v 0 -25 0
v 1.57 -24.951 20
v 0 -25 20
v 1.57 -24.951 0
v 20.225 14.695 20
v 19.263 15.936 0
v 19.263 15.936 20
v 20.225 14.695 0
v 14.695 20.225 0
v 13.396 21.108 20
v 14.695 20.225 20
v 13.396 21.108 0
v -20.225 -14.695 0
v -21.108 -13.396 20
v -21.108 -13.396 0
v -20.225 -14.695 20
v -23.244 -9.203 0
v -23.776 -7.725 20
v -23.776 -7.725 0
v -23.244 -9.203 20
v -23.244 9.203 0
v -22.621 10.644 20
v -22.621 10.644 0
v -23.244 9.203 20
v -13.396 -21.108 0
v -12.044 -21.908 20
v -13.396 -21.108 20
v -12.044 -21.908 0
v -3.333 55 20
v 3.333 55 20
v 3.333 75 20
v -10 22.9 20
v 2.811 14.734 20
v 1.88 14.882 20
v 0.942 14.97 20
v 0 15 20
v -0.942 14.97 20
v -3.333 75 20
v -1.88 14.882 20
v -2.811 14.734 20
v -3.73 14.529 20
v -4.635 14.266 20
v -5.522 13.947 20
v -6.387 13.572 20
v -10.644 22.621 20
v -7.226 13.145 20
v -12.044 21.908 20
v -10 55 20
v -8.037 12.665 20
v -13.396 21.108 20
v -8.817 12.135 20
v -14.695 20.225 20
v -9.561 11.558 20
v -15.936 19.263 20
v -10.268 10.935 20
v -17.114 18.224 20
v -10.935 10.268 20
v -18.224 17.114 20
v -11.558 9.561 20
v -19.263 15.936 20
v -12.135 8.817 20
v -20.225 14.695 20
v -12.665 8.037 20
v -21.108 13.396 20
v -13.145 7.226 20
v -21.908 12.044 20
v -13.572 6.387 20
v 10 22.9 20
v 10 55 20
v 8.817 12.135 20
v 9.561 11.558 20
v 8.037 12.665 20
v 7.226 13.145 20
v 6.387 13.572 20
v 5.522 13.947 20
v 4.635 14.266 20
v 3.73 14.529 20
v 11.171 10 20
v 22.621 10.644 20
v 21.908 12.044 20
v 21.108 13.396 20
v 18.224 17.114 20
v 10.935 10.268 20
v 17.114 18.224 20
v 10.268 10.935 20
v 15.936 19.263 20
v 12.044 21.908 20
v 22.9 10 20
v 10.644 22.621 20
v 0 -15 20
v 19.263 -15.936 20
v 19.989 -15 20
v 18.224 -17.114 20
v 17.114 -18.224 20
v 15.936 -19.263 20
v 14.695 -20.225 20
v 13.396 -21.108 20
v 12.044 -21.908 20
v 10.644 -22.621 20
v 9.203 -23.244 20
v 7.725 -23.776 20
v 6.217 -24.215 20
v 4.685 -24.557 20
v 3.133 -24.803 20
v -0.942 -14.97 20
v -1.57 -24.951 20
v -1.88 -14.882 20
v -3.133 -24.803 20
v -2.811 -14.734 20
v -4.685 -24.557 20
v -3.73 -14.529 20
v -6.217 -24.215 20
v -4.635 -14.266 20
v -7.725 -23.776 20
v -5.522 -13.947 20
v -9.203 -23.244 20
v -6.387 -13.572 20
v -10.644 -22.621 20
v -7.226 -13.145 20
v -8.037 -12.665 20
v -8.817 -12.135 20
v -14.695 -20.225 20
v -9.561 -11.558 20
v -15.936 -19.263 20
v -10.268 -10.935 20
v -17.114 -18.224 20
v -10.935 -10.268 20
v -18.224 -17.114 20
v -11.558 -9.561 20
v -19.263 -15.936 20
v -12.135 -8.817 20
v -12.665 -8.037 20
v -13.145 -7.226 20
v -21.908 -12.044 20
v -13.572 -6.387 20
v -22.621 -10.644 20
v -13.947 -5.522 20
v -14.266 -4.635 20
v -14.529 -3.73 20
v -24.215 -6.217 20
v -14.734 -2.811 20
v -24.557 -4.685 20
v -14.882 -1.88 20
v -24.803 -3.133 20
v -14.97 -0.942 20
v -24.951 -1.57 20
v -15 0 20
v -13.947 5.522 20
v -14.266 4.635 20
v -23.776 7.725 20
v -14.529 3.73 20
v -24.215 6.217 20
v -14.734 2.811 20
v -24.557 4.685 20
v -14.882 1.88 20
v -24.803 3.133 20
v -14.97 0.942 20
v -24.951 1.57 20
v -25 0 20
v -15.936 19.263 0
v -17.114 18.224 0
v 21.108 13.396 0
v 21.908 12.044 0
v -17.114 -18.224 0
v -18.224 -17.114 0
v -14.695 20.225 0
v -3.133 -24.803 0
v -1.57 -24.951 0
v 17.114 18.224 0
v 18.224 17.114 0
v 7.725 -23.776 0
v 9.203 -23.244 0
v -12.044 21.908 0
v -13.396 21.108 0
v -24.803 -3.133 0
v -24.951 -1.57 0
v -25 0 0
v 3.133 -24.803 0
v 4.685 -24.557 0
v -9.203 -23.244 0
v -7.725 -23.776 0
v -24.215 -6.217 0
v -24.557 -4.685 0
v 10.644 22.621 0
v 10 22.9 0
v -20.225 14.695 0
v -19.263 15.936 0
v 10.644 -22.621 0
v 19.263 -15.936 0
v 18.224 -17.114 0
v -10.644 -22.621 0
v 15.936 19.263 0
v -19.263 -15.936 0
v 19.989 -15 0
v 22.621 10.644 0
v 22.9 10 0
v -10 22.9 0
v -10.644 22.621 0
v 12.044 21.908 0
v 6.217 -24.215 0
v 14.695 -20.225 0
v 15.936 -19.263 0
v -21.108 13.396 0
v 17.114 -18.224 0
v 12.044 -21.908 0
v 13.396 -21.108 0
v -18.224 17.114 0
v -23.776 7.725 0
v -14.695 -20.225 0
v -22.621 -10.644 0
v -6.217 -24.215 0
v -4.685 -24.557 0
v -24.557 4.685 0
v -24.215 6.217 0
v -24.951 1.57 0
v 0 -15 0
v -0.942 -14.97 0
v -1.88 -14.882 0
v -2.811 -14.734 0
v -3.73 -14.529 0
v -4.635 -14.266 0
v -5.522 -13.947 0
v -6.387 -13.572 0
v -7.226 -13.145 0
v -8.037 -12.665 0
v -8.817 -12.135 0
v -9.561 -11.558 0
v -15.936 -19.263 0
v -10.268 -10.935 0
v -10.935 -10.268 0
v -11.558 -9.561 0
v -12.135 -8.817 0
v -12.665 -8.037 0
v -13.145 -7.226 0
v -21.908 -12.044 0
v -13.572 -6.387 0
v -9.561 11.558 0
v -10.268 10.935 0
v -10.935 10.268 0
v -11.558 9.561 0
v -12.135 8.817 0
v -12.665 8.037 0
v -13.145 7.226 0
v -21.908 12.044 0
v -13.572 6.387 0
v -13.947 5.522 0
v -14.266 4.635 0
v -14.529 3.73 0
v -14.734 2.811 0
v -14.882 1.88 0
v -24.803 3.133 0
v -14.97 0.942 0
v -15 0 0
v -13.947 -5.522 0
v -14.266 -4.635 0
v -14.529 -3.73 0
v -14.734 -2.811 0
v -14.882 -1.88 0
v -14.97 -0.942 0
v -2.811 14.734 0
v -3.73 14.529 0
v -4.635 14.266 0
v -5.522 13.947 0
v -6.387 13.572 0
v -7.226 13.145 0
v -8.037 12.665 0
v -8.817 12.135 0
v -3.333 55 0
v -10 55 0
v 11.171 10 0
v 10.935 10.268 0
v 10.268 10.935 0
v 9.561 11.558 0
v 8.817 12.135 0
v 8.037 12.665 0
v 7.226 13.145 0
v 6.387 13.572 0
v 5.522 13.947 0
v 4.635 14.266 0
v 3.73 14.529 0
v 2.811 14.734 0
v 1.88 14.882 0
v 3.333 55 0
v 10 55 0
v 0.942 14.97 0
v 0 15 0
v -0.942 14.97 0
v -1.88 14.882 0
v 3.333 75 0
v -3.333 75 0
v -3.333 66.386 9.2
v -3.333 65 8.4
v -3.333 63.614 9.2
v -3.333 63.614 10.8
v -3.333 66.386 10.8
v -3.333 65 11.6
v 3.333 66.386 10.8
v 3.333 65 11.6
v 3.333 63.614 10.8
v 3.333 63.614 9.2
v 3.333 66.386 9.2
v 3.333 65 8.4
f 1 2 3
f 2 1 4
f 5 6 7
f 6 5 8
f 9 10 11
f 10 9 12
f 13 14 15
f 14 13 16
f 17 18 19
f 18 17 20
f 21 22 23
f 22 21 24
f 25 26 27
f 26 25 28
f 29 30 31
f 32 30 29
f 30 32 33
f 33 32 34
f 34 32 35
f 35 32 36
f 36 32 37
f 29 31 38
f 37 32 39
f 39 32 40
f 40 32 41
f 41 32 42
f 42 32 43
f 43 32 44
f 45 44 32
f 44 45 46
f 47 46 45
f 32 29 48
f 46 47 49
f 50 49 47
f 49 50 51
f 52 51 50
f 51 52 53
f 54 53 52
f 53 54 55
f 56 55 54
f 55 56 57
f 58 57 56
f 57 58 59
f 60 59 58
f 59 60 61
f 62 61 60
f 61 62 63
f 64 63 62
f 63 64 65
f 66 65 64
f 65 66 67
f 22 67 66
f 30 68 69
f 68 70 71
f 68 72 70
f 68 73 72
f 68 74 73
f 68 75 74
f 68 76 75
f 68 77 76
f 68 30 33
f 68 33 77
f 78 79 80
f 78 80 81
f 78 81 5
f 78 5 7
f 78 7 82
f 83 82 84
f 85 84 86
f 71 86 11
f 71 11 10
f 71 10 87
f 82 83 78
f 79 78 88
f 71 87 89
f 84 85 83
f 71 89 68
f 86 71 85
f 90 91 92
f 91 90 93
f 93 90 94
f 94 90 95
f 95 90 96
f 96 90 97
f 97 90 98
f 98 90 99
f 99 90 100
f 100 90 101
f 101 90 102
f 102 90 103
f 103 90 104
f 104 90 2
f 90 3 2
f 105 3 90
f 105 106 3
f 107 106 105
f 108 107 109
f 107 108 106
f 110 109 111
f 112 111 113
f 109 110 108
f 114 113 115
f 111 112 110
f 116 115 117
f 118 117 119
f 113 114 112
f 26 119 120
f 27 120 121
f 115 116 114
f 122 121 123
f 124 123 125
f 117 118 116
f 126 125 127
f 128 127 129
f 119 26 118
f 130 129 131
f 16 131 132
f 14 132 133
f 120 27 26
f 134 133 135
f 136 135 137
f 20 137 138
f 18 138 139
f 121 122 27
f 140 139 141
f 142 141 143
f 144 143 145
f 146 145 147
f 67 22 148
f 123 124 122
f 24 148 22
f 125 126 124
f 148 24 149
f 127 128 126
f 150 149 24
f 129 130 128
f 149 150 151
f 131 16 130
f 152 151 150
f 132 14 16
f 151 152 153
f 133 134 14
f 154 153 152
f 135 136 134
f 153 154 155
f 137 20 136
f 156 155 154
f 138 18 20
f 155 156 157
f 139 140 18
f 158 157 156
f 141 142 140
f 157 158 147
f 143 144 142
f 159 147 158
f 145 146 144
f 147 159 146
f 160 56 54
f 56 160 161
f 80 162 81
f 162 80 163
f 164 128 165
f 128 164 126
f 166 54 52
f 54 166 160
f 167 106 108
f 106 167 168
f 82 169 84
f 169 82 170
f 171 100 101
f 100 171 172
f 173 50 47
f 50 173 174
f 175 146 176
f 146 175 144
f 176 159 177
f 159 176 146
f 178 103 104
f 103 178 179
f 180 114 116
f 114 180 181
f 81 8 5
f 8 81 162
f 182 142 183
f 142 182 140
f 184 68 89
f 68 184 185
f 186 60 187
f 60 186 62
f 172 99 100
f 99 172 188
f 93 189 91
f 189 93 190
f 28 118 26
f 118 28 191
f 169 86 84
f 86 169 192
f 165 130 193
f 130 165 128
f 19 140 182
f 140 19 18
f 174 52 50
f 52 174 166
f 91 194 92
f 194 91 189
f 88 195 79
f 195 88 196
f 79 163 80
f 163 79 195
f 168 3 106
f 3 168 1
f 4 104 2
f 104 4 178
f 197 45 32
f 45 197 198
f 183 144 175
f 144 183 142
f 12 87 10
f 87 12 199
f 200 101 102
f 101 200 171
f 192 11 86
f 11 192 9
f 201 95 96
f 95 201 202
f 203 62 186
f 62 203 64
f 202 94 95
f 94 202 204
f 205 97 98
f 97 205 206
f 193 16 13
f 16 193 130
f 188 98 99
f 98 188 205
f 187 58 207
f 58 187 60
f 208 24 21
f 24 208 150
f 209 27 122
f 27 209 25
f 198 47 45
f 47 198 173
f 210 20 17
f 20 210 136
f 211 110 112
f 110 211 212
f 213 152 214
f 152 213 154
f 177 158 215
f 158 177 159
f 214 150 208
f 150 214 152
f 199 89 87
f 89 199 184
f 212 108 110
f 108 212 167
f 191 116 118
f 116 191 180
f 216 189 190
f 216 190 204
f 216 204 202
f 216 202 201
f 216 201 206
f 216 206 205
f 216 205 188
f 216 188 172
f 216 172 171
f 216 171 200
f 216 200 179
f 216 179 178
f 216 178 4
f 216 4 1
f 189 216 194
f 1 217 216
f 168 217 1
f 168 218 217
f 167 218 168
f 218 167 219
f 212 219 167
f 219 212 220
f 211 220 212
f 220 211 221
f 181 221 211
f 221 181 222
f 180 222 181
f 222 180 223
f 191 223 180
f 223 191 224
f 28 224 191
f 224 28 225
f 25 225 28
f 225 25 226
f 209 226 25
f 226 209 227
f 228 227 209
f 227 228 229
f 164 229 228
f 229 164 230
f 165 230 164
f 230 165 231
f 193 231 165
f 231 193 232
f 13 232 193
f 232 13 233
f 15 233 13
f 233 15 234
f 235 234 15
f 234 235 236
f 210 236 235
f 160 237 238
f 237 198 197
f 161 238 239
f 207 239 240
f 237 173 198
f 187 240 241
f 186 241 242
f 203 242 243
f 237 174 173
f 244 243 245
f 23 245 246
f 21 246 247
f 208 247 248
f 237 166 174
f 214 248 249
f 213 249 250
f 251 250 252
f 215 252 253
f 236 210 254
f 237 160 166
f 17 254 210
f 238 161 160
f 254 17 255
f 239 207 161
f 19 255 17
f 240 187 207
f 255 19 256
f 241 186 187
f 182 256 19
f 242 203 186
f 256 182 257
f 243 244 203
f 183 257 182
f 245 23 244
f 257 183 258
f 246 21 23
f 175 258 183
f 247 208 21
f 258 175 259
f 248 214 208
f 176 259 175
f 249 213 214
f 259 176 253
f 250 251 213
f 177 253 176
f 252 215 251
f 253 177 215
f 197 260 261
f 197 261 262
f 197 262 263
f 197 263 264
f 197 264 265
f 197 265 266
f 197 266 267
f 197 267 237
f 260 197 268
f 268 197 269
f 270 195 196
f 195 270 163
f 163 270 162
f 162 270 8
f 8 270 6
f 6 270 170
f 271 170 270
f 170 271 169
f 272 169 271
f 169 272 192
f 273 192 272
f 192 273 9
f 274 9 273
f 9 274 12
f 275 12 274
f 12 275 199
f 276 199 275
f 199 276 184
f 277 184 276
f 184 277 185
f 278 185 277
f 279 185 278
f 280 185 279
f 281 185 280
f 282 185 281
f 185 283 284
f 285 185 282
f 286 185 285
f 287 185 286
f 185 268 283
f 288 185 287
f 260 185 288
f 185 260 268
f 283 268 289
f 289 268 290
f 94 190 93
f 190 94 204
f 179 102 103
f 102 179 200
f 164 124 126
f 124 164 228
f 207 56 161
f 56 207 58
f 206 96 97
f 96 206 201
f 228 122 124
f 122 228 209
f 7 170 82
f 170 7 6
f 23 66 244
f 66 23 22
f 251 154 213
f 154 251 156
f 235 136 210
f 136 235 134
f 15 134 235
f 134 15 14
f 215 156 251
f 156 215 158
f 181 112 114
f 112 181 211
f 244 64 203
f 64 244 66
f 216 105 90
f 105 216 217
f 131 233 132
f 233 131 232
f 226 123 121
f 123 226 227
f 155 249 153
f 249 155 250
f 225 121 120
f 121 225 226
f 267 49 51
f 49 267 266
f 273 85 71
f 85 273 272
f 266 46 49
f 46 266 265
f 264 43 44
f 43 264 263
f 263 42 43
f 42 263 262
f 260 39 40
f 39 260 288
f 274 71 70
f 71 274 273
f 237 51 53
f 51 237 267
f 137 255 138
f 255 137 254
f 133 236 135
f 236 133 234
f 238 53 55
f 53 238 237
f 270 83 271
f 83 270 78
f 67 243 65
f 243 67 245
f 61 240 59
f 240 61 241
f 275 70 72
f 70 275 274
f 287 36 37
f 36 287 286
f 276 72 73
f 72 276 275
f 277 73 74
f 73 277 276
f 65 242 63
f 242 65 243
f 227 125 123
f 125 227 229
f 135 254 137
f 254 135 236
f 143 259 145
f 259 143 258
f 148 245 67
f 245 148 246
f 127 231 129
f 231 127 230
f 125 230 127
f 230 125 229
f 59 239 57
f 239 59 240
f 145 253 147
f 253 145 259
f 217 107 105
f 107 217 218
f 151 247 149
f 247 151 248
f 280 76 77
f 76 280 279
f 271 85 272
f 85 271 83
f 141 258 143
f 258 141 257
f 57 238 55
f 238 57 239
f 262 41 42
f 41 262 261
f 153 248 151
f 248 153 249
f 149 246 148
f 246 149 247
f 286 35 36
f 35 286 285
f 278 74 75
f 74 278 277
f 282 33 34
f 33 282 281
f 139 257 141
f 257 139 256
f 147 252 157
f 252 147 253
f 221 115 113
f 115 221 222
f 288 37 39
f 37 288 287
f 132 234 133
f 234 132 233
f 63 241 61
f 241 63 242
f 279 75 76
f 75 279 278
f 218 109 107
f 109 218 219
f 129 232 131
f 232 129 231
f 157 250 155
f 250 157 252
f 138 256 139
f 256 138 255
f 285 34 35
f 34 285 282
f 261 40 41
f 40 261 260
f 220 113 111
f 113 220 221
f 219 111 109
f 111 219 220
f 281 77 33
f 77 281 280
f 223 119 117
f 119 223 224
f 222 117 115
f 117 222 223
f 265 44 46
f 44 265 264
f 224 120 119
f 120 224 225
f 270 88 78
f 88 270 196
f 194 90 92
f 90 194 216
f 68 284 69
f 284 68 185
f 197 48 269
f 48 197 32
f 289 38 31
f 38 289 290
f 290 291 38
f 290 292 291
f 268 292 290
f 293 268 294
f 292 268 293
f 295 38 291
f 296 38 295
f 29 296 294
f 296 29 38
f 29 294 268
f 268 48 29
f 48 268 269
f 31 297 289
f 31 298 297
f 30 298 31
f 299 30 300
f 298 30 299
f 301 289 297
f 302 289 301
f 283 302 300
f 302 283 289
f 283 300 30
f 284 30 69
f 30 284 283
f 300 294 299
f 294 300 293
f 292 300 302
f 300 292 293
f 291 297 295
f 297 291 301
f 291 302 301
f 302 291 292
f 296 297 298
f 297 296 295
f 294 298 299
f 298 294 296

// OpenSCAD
// file: ../deps/nutsnbolts/data-access.scad
// Norm Nuts and Bolts - a OpenSCAD library
// Copyright (C) 2012  Johannes Kneer

// This program is free software: you can redistribute it and/or modify
// it under the terms of the GNU General Public License as published by
// the Free Software Foundation, either version 3 of the License, or
// (at your option) any later version.

// This program is distributed in the hope that it will be useful,
// but WITHOUT ANY WARRANTY; without even the implied warranty of
// MERCHANTABILITY or FITNESS FOR A PARTICULAR PURPOSE.  See the
// GNU General Public License for more details.

// You should have received a copy of the GNU General Public License
// along with this program.  If not, see <http://www.gnu.org/licenses/>.


// DATABASE ACCESS FUNCTIONS AND CONSTANTS



// == CONSTANTS ==

// screw table access keys
_NB_S_DESC            = 0;
_NB_S_FAMKEY			    = 1;
_NB_S_LENGTH          = 2;
_NB_S_NOTHREAD_LENGTH = 3;

_NB_F_DESC			      = 0;
_NB_F_OUTER_DIA       = 1;
_NB_F_INNER_DIA       = 2;
_NB_F_LEAD            = 3;
_NB_F_KEY             = 4;
_NB_F_KEY_DEPTH       = 5;
_NB_F_HEAD_HEIGHT     = 6;
_NB_F_HEAD_DIA        = 7;
_NB_F_NUT_KEY         = 8;
_NB_F_NUT_HEIGHT      = 9;
_NB_F_PITCH_FINE      = 10;
_NB_F_PITCH_MEDIUM    = 11;
_NB_F_PITCH_COARSE    = 12;


// == FUNCTIONS ==

// _get_screw("descriptor")   with descriptor = M8x25
//   find the line for a general object in the data matrix

function _get_screw(n) = data_screw[search([n], data_screw)[0]];
function _get_screw_fam(n) = data_screw_fam[search([_get_screw(n)[_NB_S_FAMKEY]], data_screw_fam)[0]];

function _get_fam(n) = data_screw_fam[search([n], data_screw_fam)[0]];


// _get_XXXXX("descriptor") functions
// find a single property in the database

function _get_desc(n)        = _get_screw(n)[_NB_S_DESC];
function _get_famkey(n)         = _get_screw(n)[_NB_S_FAMKEY];
function _get_length(n)      = _get_screw(n)[_NB_S_LENGTH];
function _get_nt_length(n)   = _get_screw(n)[_NB_S_NOTHREAD_LENGTH];

function _get_outer_dia(n)   = _get_screw_fam(n)[_NB_F_OUTER_DIA];
function _get_inner_dia(n)   = _get_screw_fam(n)[_NB_F_INNER_DIA];
function _get_lead(n)        = _get_screw_fam(n)[_NB_F_LEAD];
function _get_head_height(n) = _get_screw_fam(n)[_NB_F_HEAD_HEIGHT];
function _get_head_dia(n)    = _get_screw_fam(n)[_NB_F_HEAD_DIA];
function _get_nut_key(n)     = _get_screw_fam(n)[_NB_F_NUT_KEY];
function _get_nut_height(n)  = _get_screw_fam(n)[_NB_F_NUT_HEIGHT];
function _get_fine_pitch(n)  = _get_screw_fam(n)[_NB_F_PITCH_FINE];
function _get_medium_pitch(n)  = _get_screw_fam(n)[_NB_F_PITCH_MEDIUM];
function _get_coarse_pitch(n)  = _get_screw_fam(n)[_NB_F_PITCH_COARSE];
// file: polyScrewThread_r1.scad
/*
 *    polyScrewThread_r1.scad    by aubenc @ Thingiverse
 *
 * This script contains the library modules that can be used to generate
 * threaded rods, screws and nuts.
 *
 * http://www.thingiverse.com/thing:8796
 *
 * CC Public Domain
 */

module screw_thread(od,st,lf0,lt,rs,cs)
{
    or=od/2;
    ir=or-st/2*cos(lf0)/sin(lf0);
    pf=2*PI*or;
//    sn=floor(pf/rs);
    sn = 90;
    lfxy=360/sn;
    ttn=round(lt/st+1);
    zt=st/sn;

    intersection()
    {
        if (cs >= -1)
        {
           thread_shape(cs,lt,or,ir,sn,st);
        }

        full_thread(ttn,st,sn,zt,lfxy,or,ir);
    }
}

module hex_nut(df,hg,sth,clf,cod,crs)
{

    difference()
    {
        hex_head(hg,df);

        hex_countersink_ends(sth/2,cod,clf,crs,hg);

        screw_thread(cod,sth,clf,hg,crs,-2);
    }
}


module hex_screw(od,st,lf0,lt,rs,cs,df,hg,ntl,ntd)
{
    ntr=od/2-(st/2)*cos(lf0)/sin(lf0);

    union()
    {
        hex_head(hg,df);

        translate([0,0,hg])
        if ( ntl == 0 )
        {
            cylinder(h=0.01, r=ntr, center=true);
        }
        else
        {
            if ( ntd == -1 )
            {
                cylinder(h=ntl+0.01, r=ntr, $fn=floor(od*PI/rs), center=false);
            }
            else if ( ntd == 0 )
            {
                union()
                {
                    cylinder(h=ntl-st/2,
                             r=od/2, $fn=floor(od*PI/rs), center=false);

                    translate([0,0,ntl-st/2])
                    cylinder(h=st/2,
                             r1=od/2, r2=ntr, 
                             $fn=floor(od*PI/rs), center=false);
                }
            }
            else
            {
                cylinder(h=ntl, r=ntd/2, $fn=ntd*PI/rs, center=false);
            }
        }

        translate([0,0,ntl+hg]) screw_thread(od,st,lf0,lt,rs,cs);
    }
}

module hex_screw_0(od,st,lf0,lt,rs,cs,df,hg,ntl,ntd)
{
    ntr=od/2-(st/2)*cos(lf0)/sin(lf0);

    union()
    {
        hex_head_0(hg,df);

        translate([0,0,hg])
        if ( ntl == 0 )
        {
            cylinder(h=0.01, r=ntr, center=true);
        }
        else
        {
            if ( ntd == -1 )
            {
                cylinder(h=ntl+0.01, r=ntr, $fn=floor(od*PI/rs), center=false);
            }
            else if ( ntd == 0 )
            {
                union()
                {
                    cylinder(h=ntl-st/2,
                             r=od/2, $fn=floor(od*PI/rs), center=false);

                    translate([0,0,ntl-st/2])
                    cylinder(h=st/2,
                             r1=od/2, r2=ntr, 
                             $fn=floor(od*PI/rs), center=false);
                }
            }
            else
            {
                cylinder(h=ntl, r=ntd/2, $fn=ntd*PI/rs, center=false);
            }
        }

        translate([0,0,ntl+hg]) screw_thread(od,st,lf0,lt,rs,cs);
    }
}

module thread_shape(cs,lt,or,ir,sn,st)
{
    if ( cs == 0 )
    {
        cylinder(h=lt, r=or, $fn=sn, center=false);
    }
    else
    {
        union()
        {
            translate([0,0,st/2])
              cylinder(h=lt-st+0.005, r=or, $fn=sn, center=false);

            if ( cs == -1 || cs == 2 )
            {
                cylinder(h=st/2, r1=ir, r2=or, $fn=sn, center=false);
            }
            else
            {
                cylinder(h=st/2, r=or, $fn=sn, center=false);
            }

            translate([0,0,lt-st/2])
            if ( cs == 1 || cs == 2 )
            {
                  cylinder(h=st/2, r1=or, r2=ir, $fn=sn, center=false);
            }
            else
            {
                cylinder(h=st/2, r=or, $fn=sn, center=false);
            }
        }
    }
}

module full_thread(ttn,st,sn,zt,lfxy,or,ir)
{
  if(ir >= 0.2)
  {
    for(i=[0:ttn-1])
    {
        for(j=[0:sn-1])
			assign( pt = [	[0,                  0,                  i*st-st            ],
                        [ir*cos(j*lfxy),     ir*sin(j*lfxy),     i*st+j*zt-st       ],
                        [ir*cos((j+1)*lfxy), ir*sin((j+1)*lfxy), i*st+(j+1)*zt-st   ],
								[0,0,i*st],
                        [or*cos(j*lfxy),     or*sin(j*lfxy),     i*st+j*zt-st/2     ],
                        [or*cos((j+1)*lfxy), or*sin((j+1)*lfxy), i*st+(j+1)*zt-st/2 ],
                        [ir*cos(j*lfxy),     ir*sin(j*lfxy),     i*st+j*zt          ],
                        [ir*cos((j+1)*lfxy), ir*sin((j+1)*lfxy), i*st+(j+1)*zt      ],
                        [0,                  0,                  i*st+st            ]	])
        {
            polyhedron(points=pt,
              		  triangles=[	[1,0,3],[1,3,6],[6,3,8],[1,6,4],
											[0,1,2],[1,4,2],[2,4,5],[5,4,6],[5,6,7],[7,6,8],
											[7,8,3],[0,2,3],[3,2,7],[7,2,5]	]);
        }
    }
  }
  else
  {
    echo("Step Degrees too agresive, the thread will not be made!!");
    echo("Try to increase de value for the degrees and/or...");
    echo(" decrease the pitch value and/or...");
    echo(" increase the outer diameter value.");
  }
}

module hex_head(hg,df)
{
	rd0=df/2/sin(60);
	x0=0;	x1=df/2;	x2=x1+hg/2;
	y0=0;	y1=hg/2;	y2=hg;

	intersection()
	{
	   cylinder(h=hg, r=rd0, $fn=6, center=false);

		rotate_extrude(convexity=10, $fn=6*round(df*PI/6/0.5))
		polygon([ [x0,y0],[x1,y0],[x2,y1],[x1,y2],[x0,y2] ]);
	}
}

module hex_head_0(hg,df)
{
    cylinder(h=hg, r=df/2/sin(60), $fn=6, center=false);
}

module hex_countersink_ends(chg,cod,clf,crs,hg)
{
    translate([0,0,-0.1])
    cylinder(h=chg+0.01, 
             r1=cod/2, 
             r2=cod/2-(chg+0.1)*cos(clf)/sin(clf),
             $fn=floor(cod*PI/crs), center=false);

    translate([0,0,hg-chg+0.1])
    cylinder(h=chg+0.01, 
             r1=cod/2-(chg+0.1)*cos(clf)/sin(clf),
             r2=cod/2, 
             $fn=floor(cod*PI/crs), center=false);
}
// file: utils.scad
include <settings.scad>
include <polyScrewThread_r1.scad>

module screw(diameter) {
       hex_screw(diameter,4,55,100,1.5,2,24,8,0,0);
 
}

module big_screw() {
       screw(10);
}

module medium_screw() {
       screw(8);
}
// file: settings.scad
//// Parametrics settings

RingNumberOfTeeth=100;
DriverNumberOfTeeth=6;

ClampThickness=20;
ClampDiameter=30;
ClampLength=60;
ClampZone=20;

GrooveWidth=5;

fn=100;


RingThickness = 20; 
RingDiameter=140;
// main file
include <settings.scad>
include <utils.scad>

include <../deps/nutsnbolts/cyl_head_bolt.scad>

module clamp_screw() {
    rotate([0, 90, 0]) {
  translate([-ClampThickness/2, ClampLength + ClampDiameter/2 - ClampZone/2, -5]) {
            translate([0, 0, 20]) {
               hole_through(name="M3", l=20, cl=0.1, h=10, hcl=0.4); 
            }
            translate([0, 0, 0]) {
                nutcatch_parallel("M3", l=5);
            }
            }
        }
}

module clamp() {
    difference(){
        cylinder(ClampThickness, ClampDiameter/2+ClampThickness/2, ClampDiameter/2+ClampThickness/2, $fn=fn);
        cylinder(ClampThickness, ClampDiameter/2, ClampDiameter/2, $fn=fn);
        translate([0, -ClampDiameter/2, 0]) cube([ClampDiameter, ClampDiameter/1.2, ClampThickness]);
        translate([0,-100, ClampThickness/2]) rotate([-90, 0, 0]) big_screw();
     } ;
     difference() {
         translate([-ClampThickness/2, ClampDiameter/2, 0]) {
            difference(){
                cube([ClampThickness, ClampLength, ClampThickness]);
                translate([0, ClampLength-ClampZone, 0])cube([ClampThickness/3, ClampLength, ClampThickness]);
                translate([ClampThickness - ClampThickness/3, ClampLength-ClampZone, 0]) cube([ClampThickness/3, ClampLength, ClampThickness]);
             
            }          
        }
        clamp_screw();
    }
	 
};

clamp();
